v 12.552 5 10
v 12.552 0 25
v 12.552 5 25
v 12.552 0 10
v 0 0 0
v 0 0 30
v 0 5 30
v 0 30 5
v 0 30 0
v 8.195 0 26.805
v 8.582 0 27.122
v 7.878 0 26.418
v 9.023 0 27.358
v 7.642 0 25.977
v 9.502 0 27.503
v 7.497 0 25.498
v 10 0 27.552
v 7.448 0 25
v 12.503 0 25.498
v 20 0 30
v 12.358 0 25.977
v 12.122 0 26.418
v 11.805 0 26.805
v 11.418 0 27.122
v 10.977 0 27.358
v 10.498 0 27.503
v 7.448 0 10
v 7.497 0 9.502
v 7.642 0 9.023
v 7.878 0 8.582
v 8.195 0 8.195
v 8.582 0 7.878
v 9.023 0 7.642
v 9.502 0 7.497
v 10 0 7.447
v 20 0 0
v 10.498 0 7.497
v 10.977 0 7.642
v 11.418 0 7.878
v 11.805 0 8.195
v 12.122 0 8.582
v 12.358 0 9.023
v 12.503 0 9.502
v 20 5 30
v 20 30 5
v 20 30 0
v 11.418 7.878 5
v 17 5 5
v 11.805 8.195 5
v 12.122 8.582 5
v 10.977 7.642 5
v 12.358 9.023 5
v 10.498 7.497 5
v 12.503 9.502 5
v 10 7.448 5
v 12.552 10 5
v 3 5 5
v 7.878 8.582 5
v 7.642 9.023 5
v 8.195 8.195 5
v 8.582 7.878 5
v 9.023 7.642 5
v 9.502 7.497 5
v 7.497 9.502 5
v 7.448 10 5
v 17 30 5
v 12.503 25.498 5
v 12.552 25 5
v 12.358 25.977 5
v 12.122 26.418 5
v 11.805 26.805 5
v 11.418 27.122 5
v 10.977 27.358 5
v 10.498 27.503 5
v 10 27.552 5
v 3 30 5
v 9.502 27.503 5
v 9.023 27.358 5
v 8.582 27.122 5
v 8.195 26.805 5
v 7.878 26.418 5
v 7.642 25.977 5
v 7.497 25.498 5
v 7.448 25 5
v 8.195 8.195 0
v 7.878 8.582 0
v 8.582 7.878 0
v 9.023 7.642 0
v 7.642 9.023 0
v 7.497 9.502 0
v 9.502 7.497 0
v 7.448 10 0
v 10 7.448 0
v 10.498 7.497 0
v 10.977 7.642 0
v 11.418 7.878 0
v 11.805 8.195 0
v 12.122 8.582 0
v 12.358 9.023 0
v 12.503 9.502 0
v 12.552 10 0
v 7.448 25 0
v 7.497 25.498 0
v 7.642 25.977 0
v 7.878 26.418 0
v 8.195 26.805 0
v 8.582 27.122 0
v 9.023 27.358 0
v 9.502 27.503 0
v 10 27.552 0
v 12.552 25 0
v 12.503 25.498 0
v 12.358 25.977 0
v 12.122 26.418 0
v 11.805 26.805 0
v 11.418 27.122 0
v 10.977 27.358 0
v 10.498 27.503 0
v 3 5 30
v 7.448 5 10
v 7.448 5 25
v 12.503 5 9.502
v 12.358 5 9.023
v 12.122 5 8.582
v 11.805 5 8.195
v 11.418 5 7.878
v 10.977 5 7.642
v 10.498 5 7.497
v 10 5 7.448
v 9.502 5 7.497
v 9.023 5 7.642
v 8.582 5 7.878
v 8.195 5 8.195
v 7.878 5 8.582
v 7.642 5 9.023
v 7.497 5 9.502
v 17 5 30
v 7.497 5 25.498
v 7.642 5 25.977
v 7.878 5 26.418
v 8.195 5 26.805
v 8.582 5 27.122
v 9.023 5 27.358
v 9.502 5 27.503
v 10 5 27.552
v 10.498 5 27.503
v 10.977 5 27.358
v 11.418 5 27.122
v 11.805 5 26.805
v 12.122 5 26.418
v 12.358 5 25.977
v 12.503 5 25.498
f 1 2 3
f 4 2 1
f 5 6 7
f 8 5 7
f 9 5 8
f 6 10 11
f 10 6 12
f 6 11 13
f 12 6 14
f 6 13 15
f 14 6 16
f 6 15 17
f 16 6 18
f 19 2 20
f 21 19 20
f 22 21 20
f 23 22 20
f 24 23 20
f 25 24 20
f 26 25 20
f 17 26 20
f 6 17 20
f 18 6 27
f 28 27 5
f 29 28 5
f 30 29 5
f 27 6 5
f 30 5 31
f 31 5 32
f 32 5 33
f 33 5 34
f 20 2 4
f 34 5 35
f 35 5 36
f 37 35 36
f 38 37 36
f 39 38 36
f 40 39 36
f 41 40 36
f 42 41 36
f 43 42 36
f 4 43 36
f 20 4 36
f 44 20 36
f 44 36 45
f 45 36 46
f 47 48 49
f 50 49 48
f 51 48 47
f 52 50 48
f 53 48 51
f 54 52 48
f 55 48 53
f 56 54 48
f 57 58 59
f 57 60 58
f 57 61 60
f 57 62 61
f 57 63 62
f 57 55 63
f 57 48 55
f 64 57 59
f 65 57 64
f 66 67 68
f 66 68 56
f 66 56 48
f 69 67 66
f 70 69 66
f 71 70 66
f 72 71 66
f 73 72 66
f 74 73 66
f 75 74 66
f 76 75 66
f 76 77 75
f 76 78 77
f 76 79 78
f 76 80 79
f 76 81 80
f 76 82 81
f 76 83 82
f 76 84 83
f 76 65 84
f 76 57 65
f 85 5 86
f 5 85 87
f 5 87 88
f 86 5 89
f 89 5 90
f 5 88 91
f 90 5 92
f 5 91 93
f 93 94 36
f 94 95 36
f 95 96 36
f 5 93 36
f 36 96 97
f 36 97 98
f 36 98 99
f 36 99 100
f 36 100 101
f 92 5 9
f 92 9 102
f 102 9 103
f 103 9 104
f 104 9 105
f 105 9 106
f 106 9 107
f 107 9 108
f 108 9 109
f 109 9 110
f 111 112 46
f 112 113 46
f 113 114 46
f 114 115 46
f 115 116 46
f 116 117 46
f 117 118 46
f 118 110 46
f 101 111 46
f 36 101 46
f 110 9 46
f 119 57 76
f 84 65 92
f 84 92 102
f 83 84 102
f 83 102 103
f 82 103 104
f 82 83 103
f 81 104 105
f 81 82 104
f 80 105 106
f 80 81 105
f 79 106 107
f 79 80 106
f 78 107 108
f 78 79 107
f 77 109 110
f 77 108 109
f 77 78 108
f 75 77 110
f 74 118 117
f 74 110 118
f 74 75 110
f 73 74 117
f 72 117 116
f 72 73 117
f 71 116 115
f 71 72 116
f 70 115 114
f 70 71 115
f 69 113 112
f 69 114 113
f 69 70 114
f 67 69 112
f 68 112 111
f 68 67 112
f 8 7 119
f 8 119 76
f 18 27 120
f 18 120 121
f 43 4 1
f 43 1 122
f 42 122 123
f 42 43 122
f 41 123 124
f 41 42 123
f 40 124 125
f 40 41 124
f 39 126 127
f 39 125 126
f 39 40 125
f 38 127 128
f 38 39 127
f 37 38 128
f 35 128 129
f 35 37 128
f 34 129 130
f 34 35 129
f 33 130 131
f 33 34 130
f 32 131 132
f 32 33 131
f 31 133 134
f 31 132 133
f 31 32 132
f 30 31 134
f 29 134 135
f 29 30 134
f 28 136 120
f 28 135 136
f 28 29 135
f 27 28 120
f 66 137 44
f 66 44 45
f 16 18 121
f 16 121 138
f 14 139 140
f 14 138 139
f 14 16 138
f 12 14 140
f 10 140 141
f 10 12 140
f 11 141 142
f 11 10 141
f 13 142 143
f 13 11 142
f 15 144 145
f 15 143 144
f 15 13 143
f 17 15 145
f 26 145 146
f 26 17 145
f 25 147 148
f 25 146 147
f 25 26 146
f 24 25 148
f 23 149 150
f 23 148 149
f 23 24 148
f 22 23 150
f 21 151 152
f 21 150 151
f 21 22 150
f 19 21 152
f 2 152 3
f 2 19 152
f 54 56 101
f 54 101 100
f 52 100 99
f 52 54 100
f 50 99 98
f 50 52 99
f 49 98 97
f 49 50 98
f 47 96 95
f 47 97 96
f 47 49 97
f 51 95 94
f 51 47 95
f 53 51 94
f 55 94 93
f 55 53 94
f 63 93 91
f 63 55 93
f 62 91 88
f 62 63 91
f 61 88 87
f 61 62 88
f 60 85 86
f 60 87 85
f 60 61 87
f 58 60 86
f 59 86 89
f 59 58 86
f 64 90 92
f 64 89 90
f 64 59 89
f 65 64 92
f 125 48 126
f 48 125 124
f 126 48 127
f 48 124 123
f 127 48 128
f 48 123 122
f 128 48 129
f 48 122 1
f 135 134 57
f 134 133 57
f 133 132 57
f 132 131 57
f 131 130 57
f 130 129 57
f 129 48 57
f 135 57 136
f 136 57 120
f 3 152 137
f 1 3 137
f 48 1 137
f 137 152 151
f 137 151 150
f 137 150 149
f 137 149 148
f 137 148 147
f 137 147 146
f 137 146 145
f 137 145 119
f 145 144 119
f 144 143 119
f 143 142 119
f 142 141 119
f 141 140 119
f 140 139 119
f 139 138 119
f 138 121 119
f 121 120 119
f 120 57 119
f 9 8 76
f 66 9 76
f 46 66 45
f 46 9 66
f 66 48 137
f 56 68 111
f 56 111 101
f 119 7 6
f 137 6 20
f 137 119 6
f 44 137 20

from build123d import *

# Parameters (mm, degrees)
ESQUISSE1_W                  = 20
ESQUISSE1_H                  = 30
BOSS_EXTRU_1_DEPTH           = 30
COQUE1_START                 = 3
COQUE1_OUTLINE_W             = 25
COQUE1_OUTLINE_H             = 25
COQUE1_DEPTH                 = 14
ENL_V_MAT_EXTRU_1_DEPTH      = 47.904157598
ENL_V_MAT_EXTRU_1_DEPTH_BACK = 47.904157598
ENL_V_MAT_EXTRU_2_DEPTH      = 44.874821937
R_P_TITION_CIRCULAIRE1_COUNT = 2
R_P_TITION_CIRCULAIRE1_ANGLE = 270


# Read off the part's stored shape, not the designer's step: Coque1
with BuildPart() as part:
    # Esquisse1 → Boss.-Extru.1 (new body)
    with BuildSketch(Plane.XY):
        with Locations((10, 15)):
            Rectangle(ESQUISSE1_W, ESQUISSE1_H)
    extrude(amount=BOSS_EXTRU_1_DEPTH)

    # Coque1 outline → Coque1 (cut)
    with BuildSketch(Plane.YZ.offset(COQUE1_START)):
        with Locations((17.5, 17.5)):
            Rectangle(COQUE1_OUTLINE_W, COQUE1_OUTLINE_H)
    extrude(amount=COQUE1_DEPTH, mode=Mode.SUBTRACT)

    # Esquisse3 → Enlèv. mat.-Extru.1 (cut, two sides: drawn at the far end of the back side and taken through both)
    with BuildSketch(Plane(origin=(20, 0, 0), x_dir=(0, 0, -1), z_dir=(1, 0, 0)).offset(-ENL_V_MAT_EXTRU_1_DEPTH_BACK)):
        Polygon((-5, 30), (-30, 30), (-30, 5), align=None)
    extrude(amount=ENL_V_MAT_EXTRU_1_DEPTH + ENL_V_MAT_EXTRU_1_DEPTH_BACK, mode=Mode.SUBTRACT)

    # Esquisse5 → Enlèv. mat.-Extru.2 (cut, symmetric)
    with BuildSketch(Plane.XY.offset(5)):
        with BuildLine():
            Line((12.5525, 25), (12.5525, 10))
            ThreePointArc((12.5525, 10), (10, 7.4475), (7.4475, 10))
            Line((7.4475, 10), (7.4475, 25))
            ThreePointArc((7.4475, 25), (10, 27.5525), (12.5525, 25))
        make_face()
    enl_v_mat_extru_2 = extrude(amount=ENL_V_MAT_EXTRU_2_DEPTH, both=True, mode=Mode.SUBTRACT)

    # Répétition circulaire1: Enlèv. mat.-Extru.2 ×2 about axis
    r_p_tition_circulaire1_axis = Axis((0, 5, 5), (-1, 0, 0))
    for i in range(1, R_P_TITION_CIRCULAIRE1_COUNT):
        add(enl_v_mat_extru_2.rotate(r_p_tition_circulaire1_axis, i * R_P_TITION_CIRCULAIRE1_ANGLE / (R_P_TITION_CIRCULAIRE1_COUNT - 1)), mode=Mode.SUBTRACT)


solid = part.part
